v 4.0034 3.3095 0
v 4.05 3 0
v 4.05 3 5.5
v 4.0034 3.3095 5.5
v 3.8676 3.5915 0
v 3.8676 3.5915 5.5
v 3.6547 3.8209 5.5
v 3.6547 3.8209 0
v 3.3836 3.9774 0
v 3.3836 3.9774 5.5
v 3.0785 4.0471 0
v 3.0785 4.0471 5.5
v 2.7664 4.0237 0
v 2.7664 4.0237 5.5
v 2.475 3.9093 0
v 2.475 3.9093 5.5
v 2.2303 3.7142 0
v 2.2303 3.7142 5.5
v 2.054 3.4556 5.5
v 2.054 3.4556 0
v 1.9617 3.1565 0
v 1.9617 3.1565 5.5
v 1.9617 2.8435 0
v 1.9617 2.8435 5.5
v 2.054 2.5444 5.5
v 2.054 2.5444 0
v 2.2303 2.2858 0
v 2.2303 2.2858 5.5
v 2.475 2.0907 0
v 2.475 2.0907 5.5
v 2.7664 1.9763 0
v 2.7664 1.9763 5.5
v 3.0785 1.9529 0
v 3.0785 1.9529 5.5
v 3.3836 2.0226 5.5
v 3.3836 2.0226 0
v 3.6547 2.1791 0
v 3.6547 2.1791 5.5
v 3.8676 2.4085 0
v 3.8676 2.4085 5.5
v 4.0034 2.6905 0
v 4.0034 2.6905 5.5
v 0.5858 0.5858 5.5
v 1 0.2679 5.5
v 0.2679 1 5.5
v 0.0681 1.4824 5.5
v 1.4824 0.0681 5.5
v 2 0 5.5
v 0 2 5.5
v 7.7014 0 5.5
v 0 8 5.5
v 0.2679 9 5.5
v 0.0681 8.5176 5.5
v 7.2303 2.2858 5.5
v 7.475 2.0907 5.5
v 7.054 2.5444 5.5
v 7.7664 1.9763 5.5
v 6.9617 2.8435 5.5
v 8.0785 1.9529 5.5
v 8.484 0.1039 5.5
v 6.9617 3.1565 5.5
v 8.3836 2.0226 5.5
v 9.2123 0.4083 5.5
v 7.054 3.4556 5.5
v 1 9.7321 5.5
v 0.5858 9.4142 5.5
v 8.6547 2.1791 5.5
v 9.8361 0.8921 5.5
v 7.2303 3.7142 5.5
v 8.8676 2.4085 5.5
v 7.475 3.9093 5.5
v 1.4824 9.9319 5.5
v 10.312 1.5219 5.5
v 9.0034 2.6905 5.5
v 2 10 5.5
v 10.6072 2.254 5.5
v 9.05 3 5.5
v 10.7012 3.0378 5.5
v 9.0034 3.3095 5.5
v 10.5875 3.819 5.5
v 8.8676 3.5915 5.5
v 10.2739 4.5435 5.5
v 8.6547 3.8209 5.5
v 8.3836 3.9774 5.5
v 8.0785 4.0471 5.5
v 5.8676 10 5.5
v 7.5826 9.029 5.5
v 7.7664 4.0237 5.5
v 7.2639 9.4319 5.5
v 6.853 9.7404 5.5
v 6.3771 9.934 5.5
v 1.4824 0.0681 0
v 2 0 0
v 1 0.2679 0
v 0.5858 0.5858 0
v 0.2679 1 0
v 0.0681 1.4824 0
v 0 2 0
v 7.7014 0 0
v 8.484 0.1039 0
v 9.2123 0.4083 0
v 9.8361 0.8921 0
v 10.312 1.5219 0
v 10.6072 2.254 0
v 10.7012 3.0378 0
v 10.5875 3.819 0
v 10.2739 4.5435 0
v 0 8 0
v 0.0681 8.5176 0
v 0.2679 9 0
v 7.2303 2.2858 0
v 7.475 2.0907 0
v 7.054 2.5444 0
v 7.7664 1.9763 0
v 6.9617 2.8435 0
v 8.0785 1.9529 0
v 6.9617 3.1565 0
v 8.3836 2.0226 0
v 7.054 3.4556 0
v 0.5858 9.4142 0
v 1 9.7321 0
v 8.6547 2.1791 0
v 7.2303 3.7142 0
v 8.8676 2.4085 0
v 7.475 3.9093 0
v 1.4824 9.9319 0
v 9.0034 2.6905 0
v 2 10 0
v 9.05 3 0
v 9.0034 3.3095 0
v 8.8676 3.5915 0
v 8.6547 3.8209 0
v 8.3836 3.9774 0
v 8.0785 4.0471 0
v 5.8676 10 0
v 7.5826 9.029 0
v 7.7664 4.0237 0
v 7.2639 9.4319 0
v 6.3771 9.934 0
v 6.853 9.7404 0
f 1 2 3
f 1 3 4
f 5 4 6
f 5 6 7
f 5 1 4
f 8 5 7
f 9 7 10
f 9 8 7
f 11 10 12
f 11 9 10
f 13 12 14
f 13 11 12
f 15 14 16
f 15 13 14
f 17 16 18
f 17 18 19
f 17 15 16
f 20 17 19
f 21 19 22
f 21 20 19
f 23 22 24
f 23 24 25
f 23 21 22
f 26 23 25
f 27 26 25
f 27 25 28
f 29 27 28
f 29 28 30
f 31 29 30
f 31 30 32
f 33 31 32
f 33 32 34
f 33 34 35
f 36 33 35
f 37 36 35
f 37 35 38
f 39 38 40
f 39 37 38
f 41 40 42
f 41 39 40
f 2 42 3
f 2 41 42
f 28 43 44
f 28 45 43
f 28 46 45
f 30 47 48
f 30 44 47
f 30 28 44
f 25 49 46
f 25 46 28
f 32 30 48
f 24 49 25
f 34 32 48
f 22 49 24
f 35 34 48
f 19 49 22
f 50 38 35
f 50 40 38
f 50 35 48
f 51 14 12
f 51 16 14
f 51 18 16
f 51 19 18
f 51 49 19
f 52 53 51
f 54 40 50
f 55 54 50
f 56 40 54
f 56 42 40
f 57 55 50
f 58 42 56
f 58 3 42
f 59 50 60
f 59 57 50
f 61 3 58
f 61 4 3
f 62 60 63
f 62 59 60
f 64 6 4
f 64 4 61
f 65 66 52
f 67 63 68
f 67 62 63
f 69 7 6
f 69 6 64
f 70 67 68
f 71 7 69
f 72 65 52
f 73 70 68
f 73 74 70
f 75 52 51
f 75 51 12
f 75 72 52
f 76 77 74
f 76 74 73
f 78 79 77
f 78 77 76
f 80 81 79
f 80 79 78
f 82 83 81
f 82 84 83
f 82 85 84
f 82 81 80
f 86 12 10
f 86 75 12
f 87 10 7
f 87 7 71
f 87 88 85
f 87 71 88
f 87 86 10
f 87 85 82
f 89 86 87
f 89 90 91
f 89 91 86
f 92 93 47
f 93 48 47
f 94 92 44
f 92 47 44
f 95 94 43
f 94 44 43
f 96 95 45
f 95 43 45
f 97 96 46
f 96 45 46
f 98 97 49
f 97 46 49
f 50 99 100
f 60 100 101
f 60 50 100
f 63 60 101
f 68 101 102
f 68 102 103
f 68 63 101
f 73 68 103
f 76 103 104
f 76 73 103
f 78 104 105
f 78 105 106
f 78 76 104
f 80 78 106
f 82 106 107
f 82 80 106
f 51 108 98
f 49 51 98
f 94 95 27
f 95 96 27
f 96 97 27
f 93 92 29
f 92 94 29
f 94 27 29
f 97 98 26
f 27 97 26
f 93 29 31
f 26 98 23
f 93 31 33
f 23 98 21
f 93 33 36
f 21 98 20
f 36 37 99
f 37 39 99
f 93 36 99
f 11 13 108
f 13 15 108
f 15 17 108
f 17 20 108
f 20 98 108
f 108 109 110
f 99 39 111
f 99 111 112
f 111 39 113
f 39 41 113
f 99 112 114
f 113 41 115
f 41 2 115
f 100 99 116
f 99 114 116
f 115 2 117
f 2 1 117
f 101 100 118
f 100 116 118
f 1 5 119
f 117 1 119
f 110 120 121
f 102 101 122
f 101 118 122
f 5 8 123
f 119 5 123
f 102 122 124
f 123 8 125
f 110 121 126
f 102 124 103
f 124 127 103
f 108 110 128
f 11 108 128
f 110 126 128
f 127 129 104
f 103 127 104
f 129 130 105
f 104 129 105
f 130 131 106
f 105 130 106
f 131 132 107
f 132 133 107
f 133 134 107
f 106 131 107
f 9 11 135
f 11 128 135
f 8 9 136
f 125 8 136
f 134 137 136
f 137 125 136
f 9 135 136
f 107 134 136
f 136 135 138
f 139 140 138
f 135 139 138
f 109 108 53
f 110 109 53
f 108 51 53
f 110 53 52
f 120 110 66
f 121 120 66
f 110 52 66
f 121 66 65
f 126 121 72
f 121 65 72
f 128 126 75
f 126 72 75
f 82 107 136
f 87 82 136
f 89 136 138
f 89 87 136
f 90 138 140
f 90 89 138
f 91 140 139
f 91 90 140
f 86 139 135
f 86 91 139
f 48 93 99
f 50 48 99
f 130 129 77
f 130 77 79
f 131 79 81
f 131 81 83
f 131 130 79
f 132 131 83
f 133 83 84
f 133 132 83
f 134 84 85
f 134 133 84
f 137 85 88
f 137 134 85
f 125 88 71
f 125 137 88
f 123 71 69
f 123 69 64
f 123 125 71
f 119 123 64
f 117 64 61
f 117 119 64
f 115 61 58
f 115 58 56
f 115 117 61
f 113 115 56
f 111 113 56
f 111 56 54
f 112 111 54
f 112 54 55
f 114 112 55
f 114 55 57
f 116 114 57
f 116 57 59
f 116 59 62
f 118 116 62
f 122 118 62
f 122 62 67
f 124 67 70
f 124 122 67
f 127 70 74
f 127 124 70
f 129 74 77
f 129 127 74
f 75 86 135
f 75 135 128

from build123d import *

# Parameters (mm, degrees)
SKETCH_1_R      = 1.05
EXTRUDE_1_DEPTH = 5.5
FILLET_1_R      = 3
FILLET_2_R      = 2


with BuildPart() as part:
    # ｽｹｯﾁ1 → ﾎﾞｽ - 押し出し1 (new body)
    with BuildSketch(Plane.XY):
        Polygon((0, 0), (13, 0), (7, 10), (0, 10), align=None)
        with Locations((3, 3)):
            Circle(SKETCH_1_R, mode=Mode.SUBTRACT)
        with Locations((8, 3)):
            Circle(SKETCH_1_R, mode=Mode.SUBTRACT)
    extrude(amount=EXTRUDE_1_DEPTH)

    # ﾌｨﾚｯﾄ1
    fillet_1_edges = [part.edges().sort_by_distance(p)[0] for p in [
        (13, 0, 2.75),
    ]]
    fillet(fillet_1_edges, radius=FILLET_1_R)

    # ﾌｨﾚｯﾄ2
    fillet_2_edges = [part.edges().sort_by_distance(p)[0] for p in [
        (0, 10, 2.75),
        (7, 10, 2.75),
        (0, 0, 2.75),
    ]]
    fillet(fillet_2_edges, radius=FILLET_2_R)


solid = part.part
